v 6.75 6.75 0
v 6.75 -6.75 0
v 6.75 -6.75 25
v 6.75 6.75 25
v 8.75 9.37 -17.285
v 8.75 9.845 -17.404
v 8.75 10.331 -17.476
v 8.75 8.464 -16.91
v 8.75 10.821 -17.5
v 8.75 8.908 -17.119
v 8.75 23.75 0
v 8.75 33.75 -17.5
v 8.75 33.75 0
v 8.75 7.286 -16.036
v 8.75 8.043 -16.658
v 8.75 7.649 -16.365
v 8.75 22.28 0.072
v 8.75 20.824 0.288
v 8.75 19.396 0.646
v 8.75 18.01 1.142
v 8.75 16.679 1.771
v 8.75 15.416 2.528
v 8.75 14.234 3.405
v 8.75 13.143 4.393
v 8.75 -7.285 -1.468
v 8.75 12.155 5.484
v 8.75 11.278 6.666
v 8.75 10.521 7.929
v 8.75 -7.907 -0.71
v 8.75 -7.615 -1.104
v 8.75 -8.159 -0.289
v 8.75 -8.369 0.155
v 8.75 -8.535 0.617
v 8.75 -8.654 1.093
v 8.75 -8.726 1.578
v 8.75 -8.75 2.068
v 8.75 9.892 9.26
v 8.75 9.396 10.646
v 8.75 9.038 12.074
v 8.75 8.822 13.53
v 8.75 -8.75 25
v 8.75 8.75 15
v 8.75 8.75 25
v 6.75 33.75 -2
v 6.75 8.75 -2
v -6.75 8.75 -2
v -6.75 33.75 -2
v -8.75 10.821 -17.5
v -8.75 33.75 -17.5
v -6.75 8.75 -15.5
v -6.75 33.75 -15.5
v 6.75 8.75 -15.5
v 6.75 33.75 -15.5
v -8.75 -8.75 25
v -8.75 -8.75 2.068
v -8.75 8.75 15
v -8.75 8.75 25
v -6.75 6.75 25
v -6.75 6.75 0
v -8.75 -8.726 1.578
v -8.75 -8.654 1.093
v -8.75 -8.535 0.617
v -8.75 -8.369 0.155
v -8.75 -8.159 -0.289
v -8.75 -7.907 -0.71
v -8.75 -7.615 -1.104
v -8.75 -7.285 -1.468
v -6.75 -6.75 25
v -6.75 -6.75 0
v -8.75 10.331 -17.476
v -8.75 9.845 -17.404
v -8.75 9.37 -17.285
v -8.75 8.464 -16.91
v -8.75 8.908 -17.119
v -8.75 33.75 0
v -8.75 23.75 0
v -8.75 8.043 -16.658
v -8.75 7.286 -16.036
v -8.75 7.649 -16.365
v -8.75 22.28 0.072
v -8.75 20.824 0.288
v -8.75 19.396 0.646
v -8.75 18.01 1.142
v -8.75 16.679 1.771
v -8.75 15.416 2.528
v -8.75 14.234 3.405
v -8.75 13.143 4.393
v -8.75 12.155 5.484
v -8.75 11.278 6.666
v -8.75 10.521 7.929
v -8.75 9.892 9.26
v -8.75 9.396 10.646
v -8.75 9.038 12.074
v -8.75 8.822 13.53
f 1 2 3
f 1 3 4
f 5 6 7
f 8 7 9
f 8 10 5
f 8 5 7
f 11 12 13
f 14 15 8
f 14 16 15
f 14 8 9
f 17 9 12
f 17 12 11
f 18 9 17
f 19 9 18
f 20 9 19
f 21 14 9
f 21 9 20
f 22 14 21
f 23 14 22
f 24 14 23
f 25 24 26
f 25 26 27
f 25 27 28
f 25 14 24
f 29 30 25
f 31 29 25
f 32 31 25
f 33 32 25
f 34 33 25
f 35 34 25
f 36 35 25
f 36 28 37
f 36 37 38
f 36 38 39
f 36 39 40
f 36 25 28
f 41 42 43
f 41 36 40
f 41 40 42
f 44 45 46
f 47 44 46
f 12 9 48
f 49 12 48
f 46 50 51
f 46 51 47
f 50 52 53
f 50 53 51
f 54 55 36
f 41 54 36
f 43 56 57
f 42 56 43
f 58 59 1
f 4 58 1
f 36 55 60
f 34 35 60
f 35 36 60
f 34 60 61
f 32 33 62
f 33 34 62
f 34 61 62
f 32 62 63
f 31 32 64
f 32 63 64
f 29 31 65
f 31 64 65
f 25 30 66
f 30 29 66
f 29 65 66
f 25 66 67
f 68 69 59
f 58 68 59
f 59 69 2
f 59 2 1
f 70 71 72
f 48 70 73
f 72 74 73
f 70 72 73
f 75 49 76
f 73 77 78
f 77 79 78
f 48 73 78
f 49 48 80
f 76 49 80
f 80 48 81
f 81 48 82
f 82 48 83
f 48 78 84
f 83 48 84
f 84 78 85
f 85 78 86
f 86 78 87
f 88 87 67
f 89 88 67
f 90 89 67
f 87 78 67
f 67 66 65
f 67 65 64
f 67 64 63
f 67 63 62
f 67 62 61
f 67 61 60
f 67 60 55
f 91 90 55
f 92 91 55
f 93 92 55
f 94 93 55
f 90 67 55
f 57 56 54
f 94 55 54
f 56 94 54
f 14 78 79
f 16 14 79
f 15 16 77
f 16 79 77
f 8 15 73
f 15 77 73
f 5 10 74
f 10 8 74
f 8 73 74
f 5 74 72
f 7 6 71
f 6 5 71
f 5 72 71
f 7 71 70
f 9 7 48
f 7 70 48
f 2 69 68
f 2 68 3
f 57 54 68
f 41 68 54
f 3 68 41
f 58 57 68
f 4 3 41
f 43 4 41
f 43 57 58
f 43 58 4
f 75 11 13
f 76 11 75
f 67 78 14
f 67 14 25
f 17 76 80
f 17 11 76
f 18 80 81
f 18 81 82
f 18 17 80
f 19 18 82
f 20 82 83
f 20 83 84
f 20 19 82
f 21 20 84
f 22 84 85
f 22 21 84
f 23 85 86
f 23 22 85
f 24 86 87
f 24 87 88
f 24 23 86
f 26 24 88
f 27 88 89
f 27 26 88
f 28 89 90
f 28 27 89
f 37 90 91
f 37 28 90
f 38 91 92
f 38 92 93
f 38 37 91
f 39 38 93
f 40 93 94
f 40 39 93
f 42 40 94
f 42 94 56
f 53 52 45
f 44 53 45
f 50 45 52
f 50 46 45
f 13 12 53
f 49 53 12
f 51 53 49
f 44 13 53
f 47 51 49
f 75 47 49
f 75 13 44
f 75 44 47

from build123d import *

# Parameters (mm, degrees)
F1_W        = 17.5
F1_H        = 17.5
F1_W_2      = 13.5
F1_H_2      = 13.5
F2_DEPTH    = 25
F3_W        = 17.5
F3_H        = 17.5
F3_W_2      = 13.5
F3_H_2      = 13.5
F4_DEPTH    = 25
F6_DEPTH    = 17.5
F7_T1_DEPTH = 18.2385988642
F7_T3_DEPTH = 27.8540843944
F7_T5_DEPTH = 27.867199163
F8_R        = 15


# Not quite as in the source:
# - a fillet or chamfer that OpenCascade refuses, or shapes differently, is made with other operations: its cross-section is extruded or revolved along the edge and cut away or added


with BuildPart() as f2:
    # F1 (on Top) → F2 (new body)
    with BuildSketch(Plane.XY):
        Rectangle(F1_W, F1_H)
        Rectangle(F1_W_2, F1_H_2, mode=Mode.SUBTRACT)
    extrude(amount=F2_DEPTH)

    # F3 (on face) → F4 (join)
    with BuildSketch(Plane(origin=(0, 8.75, 0), x_dir=(-1, 0, 0), z_dir=(0, 1, 0))):
        with Locations((0, -8.75)):
            Rectangle(F3_W, F3_H)
        with Locations((0, -8.75)):
            Rectangle(F3_W_2, F3_H_2, mode=Mode.SUBTRACT)
    extrude(amount=F4_DEPTH)

    # F5 (on face) → F6 (join, through all)
    with BuildSketch(Plane(origin=(-8.75, 0, 0), x_dir=(0, -1, 0), z_dir=(-1, 0, 0))):
        Polygon((-8.75, 0), (-8.75, -17.5), (8.7529988959, 0), align=None)
    extrude(amount=-F6_DEPTH)

    # F7: fillet of radius 5 on 3 edges, made by hand

    # F7_s2 → F7_t1 (cut)
    with BuildSketch(Plane.YZ.offset(-9.1192994321)):
        with BuildLine():
            ThreePointArc((-8.75, 0), (-8.6996483838, -0.052591736), (-8.6485362941, -0.1044447036))
            Line((-8.6485362941, -0.1044447036), (-8.7529988959, 0))
            Line((-8.7529988959, 0), (-8.75, 0))
        make_face()
    extrude(amount=F7_T1_DEPTH, mode=Mode.SUBTRACT)

    # F7_s4 → F7_t3 (cut)
    with BuildSketch(Plane.YZ.offset(-13.9270421972)):
        with BuildLine():
            ThreePointArc((7.2855858942, -16.0358368012), (8.9075976032, -17.1194796247), (10.8208168789, -17.5))
            Line((10.8208168789, -17.5), (8.75, -17.5))
            Line((8.75, -17.5), (7.2855858942, -16.0358368012))
        make_face()
    extrude(amount=F7_T3_DEPTH, mode=Mode.SUBTRACT)

    # F7_s6 → F7_t5 (cut)
    with BuildSketch(Plane.YZ.offset(-13.9335995815)):
        with BuildLine():
            ThreePointArc((-8.75, 2.0683203716), (-8.3693156919, 0.1547053272), (-7.2852309847, -1.4675164296))
            Line((-7.2852309847, -1.4675164296), (-7.6387540831, -1.8211001097))
            ThreePointArc((-7.6387540831, -1.8211001097), (-9.0020593926, -0.4580283837), (-9.1136694691, -0.3431392098))
            Line((-9.1136694691, -0.3431392098), (-9.25, 0))
            Line((-9.25, 0), (-9.25, 2.0683203716))
            Line((-9.25, 2.0683203716), (-8.75, 2.0683203716))
        make_face()
    extrude(amount=F7_T5_DEPTH, mode=Mode.SUBTRACT)

    # F8
    f8_edges = [f2.edges().sort_by_distance(p)[0] for p in [
        (0, 8.75, 0),
    ]]
    fillet(f8_edges, radius=F8_R)


solid = f2.part
